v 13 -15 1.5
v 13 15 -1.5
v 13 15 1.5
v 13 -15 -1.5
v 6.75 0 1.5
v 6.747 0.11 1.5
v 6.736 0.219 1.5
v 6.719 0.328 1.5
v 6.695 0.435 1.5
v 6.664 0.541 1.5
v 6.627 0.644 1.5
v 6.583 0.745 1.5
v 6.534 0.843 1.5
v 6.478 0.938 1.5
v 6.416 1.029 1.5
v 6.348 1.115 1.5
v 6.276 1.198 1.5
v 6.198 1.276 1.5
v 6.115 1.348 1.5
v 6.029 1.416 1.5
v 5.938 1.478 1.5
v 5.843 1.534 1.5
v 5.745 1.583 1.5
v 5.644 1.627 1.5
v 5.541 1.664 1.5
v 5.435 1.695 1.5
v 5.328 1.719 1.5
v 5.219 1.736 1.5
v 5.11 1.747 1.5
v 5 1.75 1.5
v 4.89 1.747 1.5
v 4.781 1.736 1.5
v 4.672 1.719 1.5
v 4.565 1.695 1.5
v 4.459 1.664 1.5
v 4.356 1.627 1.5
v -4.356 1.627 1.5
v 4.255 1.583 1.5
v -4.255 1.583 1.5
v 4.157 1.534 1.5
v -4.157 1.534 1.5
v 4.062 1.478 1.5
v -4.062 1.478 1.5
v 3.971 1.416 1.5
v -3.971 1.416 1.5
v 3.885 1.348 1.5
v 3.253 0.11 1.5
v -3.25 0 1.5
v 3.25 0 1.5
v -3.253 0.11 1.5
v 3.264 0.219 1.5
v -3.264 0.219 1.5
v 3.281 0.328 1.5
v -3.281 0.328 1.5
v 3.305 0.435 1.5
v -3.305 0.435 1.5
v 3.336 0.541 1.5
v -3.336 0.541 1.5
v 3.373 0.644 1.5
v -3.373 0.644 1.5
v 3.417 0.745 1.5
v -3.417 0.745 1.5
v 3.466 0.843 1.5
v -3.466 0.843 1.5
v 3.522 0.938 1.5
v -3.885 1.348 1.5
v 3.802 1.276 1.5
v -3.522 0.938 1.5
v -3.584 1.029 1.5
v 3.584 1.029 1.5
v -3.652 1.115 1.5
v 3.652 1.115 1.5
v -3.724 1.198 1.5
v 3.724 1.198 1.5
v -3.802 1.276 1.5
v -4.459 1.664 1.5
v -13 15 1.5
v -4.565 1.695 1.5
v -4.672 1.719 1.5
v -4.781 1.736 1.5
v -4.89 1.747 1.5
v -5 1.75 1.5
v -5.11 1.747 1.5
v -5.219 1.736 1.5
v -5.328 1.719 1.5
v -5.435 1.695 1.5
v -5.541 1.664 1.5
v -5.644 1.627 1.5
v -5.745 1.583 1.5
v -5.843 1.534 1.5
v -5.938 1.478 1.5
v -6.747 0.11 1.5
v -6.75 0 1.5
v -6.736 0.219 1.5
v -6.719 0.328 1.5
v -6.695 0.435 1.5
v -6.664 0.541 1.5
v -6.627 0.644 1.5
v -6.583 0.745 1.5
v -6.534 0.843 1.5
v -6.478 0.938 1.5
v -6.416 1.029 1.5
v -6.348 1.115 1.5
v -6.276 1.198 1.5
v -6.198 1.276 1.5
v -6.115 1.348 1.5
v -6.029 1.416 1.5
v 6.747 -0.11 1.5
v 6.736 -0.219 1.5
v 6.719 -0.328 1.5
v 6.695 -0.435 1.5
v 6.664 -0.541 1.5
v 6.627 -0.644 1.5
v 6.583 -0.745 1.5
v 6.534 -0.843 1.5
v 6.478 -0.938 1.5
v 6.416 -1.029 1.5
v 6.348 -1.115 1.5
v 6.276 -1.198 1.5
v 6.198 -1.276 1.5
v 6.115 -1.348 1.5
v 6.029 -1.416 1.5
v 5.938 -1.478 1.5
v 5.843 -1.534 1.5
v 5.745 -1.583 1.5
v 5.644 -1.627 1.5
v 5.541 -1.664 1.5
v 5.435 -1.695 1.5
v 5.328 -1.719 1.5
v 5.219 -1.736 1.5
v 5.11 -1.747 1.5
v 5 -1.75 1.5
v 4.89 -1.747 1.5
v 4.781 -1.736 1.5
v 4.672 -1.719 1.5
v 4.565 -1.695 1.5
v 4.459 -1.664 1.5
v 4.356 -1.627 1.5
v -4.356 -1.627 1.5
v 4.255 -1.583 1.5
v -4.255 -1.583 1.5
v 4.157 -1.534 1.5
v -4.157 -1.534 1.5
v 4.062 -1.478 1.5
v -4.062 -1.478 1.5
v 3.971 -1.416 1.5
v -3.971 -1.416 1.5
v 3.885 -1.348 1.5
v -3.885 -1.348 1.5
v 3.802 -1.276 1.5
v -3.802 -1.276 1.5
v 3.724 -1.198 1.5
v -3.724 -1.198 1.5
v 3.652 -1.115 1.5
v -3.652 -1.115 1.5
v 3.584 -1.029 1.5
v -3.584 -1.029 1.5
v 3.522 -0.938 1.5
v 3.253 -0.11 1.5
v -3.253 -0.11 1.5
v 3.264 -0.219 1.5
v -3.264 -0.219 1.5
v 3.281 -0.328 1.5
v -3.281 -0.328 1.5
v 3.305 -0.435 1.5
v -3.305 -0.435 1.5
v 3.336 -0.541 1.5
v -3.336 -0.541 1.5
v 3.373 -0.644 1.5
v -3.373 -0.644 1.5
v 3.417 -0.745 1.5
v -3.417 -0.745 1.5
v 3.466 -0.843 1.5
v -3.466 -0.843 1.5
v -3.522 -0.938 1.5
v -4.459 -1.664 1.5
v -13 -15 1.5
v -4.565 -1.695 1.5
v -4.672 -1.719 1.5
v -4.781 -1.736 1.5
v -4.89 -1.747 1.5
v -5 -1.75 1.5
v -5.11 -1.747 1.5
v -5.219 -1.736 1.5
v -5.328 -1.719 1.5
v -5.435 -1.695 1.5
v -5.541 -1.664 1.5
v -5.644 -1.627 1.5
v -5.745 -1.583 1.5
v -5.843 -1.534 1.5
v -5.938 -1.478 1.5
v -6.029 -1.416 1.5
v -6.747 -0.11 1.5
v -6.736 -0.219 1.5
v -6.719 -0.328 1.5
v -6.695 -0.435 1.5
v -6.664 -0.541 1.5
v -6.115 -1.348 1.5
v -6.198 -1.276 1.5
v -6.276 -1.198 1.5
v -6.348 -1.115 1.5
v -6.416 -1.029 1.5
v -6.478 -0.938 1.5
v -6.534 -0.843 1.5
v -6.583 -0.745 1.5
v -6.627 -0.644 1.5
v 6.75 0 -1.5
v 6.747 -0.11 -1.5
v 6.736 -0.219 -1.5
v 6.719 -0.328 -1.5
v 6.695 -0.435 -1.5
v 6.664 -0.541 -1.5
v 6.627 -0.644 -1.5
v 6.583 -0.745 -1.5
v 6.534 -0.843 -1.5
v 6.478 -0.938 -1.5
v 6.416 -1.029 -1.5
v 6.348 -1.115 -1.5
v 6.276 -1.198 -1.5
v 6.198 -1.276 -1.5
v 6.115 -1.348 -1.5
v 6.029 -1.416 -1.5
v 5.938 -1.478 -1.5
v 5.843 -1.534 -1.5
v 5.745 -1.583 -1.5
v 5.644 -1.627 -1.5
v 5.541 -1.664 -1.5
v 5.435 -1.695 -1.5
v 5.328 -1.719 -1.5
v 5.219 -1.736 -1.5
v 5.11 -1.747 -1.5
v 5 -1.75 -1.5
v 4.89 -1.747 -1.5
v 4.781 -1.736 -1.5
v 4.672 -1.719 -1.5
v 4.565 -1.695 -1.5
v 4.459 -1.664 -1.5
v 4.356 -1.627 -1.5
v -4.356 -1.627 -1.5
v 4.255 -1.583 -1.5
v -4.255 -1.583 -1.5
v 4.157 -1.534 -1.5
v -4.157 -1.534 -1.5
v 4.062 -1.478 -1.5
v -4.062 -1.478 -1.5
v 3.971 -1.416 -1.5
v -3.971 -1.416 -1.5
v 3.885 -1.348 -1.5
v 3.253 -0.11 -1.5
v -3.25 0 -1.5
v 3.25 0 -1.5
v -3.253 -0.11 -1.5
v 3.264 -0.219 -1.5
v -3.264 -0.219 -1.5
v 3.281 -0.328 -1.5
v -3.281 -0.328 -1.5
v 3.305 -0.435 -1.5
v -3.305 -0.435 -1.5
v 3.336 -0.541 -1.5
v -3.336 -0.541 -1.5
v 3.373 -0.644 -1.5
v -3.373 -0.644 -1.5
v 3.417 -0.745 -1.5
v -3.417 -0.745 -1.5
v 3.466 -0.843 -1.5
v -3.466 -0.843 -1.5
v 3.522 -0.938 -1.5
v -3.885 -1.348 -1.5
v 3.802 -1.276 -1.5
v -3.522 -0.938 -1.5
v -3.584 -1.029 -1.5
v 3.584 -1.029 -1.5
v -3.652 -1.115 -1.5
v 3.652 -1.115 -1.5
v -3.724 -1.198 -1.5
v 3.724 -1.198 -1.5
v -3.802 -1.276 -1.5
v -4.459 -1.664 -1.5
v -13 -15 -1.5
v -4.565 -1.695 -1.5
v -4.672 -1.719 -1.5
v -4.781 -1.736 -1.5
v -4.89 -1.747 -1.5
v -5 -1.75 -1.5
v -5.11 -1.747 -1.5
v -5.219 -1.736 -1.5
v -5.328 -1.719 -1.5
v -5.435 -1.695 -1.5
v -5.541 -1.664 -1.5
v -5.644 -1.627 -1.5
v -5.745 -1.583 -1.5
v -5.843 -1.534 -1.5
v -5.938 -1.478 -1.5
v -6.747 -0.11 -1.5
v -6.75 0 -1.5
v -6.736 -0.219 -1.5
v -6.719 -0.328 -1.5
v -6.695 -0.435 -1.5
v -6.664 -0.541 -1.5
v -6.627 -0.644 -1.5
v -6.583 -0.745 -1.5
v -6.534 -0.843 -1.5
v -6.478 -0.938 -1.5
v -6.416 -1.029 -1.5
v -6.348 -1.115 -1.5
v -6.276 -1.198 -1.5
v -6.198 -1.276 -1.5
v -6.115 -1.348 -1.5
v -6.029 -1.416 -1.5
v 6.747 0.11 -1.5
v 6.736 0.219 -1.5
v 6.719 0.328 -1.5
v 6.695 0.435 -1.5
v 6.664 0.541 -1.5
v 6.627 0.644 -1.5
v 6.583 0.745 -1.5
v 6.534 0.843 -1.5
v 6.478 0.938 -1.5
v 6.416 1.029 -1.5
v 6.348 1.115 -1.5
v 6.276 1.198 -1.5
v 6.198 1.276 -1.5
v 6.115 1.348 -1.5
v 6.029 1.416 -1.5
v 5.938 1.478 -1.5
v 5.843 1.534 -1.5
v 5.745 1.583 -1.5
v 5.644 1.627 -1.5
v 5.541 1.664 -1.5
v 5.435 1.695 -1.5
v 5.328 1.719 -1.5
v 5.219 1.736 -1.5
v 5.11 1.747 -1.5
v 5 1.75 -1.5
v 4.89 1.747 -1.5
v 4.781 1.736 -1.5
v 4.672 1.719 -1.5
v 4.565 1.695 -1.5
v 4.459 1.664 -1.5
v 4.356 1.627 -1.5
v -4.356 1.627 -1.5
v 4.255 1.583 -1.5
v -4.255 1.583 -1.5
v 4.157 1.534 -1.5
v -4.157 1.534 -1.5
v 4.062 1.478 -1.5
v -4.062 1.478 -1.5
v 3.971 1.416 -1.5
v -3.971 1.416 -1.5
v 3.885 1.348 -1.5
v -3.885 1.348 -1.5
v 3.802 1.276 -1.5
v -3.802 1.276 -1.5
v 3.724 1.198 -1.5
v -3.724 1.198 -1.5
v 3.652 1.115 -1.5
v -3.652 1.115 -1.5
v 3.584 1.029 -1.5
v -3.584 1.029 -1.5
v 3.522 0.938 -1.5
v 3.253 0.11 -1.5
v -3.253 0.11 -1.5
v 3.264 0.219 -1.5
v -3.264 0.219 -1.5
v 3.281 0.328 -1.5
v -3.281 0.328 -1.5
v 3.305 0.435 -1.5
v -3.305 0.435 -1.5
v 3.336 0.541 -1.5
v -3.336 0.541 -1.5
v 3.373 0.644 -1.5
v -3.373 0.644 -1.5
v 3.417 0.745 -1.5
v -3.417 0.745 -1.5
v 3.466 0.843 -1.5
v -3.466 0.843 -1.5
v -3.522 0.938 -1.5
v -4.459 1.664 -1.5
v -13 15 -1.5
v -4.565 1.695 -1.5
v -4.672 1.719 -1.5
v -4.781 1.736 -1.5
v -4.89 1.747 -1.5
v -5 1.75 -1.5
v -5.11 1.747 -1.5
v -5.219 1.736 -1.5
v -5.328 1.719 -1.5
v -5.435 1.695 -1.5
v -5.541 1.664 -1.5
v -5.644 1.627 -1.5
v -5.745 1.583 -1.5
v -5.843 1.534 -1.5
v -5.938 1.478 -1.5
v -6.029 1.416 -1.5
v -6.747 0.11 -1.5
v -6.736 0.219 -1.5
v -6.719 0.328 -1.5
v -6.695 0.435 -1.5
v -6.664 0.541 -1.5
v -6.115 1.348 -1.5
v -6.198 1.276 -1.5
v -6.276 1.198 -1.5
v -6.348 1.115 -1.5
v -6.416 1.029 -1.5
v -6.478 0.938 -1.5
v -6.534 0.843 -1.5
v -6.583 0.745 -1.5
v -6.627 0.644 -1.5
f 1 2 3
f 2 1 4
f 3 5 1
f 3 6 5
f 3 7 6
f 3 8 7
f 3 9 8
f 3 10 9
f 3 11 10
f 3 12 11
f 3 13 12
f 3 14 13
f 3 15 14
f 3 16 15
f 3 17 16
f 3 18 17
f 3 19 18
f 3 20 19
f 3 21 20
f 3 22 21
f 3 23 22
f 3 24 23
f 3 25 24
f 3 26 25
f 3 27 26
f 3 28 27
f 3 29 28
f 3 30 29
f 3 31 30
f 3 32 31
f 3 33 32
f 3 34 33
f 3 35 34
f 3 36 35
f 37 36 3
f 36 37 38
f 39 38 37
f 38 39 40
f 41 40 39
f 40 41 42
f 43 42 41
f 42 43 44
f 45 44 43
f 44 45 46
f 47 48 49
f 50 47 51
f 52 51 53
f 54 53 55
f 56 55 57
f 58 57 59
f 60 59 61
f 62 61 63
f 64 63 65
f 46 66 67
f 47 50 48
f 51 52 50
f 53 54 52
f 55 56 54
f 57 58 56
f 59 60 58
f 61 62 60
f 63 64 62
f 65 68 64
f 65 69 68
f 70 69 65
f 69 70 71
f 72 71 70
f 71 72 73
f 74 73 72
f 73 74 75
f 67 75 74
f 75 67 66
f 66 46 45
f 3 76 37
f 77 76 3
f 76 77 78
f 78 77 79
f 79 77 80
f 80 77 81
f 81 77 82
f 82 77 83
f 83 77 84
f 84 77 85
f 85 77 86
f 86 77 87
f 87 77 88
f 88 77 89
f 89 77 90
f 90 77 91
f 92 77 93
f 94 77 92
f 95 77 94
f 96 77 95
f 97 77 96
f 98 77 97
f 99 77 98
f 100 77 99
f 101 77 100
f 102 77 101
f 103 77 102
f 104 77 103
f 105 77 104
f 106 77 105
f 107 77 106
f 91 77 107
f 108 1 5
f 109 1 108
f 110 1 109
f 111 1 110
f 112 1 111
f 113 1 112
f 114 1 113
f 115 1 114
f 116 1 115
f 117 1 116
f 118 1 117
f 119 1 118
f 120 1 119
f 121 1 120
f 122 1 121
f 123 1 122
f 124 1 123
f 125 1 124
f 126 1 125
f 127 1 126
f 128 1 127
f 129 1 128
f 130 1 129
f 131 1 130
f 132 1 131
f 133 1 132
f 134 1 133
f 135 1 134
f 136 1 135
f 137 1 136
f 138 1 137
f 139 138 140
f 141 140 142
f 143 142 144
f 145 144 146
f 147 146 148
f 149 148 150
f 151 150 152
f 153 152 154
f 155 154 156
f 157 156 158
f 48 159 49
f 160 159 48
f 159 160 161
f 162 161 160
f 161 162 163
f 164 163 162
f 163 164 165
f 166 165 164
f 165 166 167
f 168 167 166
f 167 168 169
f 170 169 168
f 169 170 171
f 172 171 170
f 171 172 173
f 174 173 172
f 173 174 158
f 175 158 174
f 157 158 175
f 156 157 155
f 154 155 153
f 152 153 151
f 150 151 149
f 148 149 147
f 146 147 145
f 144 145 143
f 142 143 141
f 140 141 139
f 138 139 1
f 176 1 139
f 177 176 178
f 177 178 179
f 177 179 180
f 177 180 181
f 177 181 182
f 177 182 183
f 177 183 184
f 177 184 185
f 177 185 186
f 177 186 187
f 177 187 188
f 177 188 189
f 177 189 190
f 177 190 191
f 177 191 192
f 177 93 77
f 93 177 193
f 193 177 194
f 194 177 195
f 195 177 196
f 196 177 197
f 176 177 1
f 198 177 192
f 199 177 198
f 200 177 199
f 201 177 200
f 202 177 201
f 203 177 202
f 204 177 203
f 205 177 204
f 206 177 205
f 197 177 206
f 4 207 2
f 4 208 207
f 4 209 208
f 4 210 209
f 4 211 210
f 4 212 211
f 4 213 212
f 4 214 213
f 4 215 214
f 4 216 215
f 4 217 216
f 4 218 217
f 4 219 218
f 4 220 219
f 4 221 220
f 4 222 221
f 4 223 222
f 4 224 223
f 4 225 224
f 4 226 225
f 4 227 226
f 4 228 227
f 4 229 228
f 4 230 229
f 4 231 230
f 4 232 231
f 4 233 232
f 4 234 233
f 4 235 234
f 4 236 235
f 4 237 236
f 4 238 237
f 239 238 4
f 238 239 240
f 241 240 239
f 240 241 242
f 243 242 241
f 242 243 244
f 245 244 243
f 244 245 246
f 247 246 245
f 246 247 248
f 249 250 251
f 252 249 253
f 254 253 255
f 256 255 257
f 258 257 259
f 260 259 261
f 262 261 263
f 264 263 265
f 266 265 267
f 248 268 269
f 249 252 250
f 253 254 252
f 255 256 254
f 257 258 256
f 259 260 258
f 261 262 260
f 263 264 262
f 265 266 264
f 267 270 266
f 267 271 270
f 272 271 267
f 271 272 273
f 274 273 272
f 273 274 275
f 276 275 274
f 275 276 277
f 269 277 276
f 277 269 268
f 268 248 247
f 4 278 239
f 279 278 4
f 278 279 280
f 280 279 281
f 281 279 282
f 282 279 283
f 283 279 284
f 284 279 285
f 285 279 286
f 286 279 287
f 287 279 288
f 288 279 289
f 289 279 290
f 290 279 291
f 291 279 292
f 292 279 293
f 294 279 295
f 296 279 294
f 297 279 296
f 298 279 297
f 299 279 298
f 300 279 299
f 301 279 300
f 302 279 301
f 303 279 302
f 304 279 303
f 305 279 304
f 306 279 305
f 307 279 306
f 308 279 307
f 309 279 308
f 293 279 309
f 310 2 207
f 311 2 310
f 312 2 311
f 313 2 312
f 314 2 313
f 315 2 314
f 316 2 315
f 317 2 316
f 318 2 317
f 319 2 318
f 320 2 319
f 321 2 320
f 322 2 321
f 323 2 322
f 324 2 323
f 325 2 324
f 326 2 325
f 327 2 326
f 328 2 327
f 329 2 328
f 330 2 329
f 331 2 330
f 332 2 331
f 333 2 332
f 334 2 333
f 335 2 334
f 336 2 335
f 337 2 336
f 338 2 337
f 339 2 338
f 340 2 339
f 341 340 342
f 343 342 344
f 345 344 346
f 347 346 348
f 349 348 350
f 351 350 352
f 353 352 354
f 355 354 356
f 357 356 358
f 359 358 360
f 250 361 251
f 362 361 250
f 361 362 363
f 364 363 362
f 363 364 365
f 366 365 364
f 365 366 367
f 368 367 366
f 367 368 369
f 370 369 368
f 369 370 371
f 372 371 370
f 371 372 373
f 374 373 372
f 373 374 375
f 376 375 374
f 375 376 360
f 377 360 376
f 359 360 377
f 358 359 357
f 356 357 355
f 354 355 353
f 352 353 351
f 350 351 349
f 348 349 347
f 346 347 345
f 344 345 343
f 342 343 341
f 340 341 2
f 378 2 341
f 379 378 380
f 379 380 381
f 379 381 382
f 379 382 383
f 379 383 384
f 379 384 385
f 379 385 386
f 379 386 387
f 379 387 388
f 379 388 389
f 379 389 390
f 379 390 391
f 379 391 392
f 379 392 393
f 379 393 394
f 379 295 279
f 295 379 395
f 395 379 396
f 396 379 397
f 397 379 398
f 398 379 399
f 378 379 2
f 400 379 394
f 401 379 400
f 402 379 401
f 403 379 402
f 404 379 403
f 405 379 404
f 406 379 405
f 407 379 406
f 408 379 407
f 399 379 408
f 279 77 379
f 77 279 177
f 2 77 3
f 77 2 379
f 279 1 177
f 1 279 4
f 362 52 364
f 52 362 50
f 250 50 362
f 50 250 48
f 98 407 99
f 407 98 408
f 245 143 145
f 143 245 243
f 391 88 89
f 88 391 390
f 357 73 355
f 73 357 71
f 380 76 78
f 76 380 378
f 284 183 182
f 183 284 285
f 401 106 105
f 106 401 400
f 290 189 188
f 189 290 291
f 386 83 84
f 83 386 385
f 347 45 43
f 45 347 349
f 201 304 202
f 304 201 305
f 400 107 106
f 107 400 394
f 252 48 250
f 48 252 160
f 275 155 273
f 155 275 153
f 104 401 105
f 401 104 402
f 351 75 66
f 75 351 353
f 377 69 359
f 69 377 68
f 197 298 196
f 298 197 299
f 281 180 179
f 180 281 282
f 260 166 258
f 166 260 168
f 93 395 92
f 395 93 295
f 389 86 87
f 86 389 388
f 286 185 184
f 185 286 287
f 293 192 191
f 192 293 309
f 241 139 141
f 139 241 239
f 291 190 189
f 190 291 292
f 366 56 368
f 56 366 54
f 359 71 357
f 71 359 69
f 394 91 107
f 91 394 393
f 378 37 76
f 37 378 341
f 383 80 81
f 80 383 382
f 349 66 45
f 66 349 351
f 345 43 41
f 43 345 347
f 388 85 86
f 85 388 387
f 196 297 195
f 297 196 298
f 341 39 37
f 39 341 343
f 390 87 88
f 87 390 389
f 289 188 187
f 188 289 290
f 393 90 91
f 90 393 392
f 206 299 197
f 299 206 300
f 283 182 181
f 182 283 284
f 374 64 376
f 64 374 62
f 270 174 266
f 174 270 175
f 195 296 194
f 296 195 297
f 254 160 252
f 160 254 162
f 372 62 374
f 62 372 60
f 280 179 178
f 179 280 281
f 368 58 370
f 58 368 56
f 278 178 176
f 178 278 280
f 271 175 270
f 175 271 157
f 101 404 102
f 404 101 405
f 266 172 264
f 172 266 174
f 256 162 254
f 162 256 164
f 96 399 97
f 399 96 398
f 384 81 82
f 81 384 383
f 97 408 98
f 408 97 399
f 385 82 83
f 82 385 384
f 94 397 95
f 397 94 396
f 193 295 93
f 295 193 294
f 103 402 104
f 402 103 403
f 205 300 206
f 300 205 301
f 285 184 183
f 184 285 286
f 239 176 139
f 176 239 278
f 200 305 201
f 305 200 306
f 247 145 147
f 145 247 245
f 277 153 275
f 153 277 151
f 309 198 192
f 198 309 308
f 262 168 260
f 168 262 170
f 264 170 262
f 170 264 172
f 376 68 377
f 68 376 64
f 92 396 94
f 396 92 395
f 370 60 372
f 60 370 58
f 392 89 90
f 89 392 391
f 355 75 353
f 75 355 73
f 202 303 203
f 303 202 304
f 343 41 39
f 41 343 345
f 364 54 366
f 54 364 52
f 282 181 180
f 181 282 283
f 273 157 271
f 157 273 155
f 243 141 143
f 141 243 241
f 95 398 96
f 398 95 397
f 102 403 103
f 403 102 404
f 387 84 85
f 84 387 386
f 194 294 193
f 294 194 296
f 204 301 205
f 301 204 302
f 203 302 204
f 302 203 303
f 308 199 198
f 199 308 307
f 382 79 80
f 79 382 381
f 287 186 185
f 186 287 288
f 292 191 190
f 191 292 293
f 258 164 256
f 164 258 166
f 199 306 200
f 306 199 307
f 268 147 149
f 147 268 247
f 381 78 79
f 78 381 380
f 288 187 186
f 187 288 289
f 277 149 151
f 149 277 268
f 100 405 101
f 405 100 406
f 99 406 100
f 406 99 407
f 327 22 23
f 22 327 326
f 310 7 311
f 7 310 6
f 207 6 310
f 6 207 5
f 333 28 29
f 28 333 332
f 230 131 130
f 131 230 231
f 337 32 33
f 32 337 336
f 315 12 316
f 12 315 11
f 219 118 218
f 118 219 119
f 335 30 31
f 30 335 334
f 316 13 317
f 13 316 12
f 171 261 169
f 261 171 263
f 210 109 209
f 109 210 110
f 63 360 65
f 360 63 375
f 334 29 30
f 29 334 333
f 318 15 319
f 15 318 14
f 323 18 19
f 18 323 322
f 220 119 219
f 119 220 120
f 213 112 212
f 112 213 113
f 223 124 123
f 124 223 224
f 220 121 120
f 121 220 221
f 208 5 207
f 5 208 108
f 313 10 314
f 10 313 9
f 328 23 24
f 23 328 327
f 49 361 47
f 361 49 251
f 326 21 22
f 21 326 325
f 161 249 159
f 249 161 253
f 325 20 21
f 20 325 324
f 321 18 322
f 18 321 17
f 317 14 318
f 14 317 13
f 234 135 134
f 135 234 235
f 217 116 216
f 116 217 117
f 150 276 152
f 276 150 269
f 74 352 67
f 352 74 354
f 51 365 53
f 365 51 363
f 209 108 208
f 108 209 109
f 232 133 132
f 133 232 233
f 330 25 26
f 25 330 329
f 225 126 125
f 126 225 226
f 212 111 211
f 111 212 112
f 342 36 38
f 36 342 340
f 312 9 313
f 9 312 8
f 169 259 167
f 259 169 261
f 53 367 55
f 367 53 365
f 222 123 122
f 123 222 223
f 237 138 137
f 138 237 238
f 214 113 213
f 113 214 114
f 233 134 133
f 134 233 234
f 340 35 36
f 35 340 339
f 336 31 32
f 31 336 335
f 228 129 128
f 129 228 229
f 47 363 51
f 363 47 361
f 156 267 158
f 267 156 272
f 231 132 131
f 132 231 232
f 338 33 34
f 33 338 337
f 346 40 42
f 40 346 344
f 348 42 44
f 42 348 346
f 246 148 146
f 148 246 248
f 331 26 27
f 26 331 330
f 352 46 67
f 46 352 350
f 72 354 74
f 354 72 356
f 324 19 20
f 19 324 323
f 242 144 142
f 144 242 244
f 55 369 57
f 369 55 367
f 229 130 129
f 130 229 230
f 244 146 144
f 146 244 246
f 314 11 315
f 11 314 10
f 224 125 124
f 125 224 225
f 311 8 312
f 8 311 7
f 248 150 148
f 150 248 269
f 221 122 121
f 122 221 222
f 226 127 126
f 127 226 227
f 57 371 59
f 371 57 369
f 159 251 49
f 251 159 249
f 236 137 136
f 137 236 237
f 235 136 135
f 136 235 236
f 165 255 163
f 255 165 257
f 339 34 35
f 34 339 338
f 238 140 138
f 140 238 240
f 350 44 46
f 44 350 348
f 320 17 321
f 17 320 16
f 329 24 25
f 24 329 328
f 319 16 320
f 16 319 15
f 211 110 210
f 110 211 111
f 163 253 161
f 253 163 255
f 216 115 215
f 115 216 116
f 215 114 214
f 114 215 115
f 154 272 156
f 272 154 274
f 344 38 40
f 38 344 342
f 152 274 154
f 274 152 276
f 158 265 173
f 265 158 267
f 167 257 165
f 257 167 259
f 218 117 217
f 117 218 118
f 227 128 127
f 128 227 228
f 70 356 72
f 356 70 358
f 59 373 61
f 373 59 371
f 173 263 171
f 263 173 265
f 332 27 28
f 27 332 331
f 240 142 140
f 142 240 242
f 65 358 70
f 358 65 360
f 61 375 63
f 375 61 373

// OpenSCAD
holes_pitch = 30;
walls = 3;
chain_height = 10;
chain_pitch = 10;
hole_size = 3.5;
h_base = 100;

w = holes_pitch + 4*walls;


module hb_chain_holder() {
	difference() {
		translate([w/-2, h_base/-2, 0]) union() {
			cube(size=[w, h_base, walls]);
			cube(size=[w, walls, chain_height]);
		}
		cube(size=[hole_size, h_base-3*walls, walls*5], center=true);
		translate([holes_pitch/-2, 0, 0]) cube(size=[hole_size, h_base-3*walls, walls*5], center=true);
		translate([holes_pitch/2, 0, 0]) cube(size=[hole_size, h_base-3*walls, walls*5], center=true);

		translate([chain_pitch/-2, h_base/-2+walls+1, chain_height/2]) rotate(a=[90, 0, 0]) cylinder(d=hole_size, h=walls*3, $fn=100);
		translate([chain_pitch/2, h_base/-2+walls+1, chain_height/2]) rotate(a=[90, 0, 0]) cylinder(d=hole_size, h=walls*3, $fn=100);
	}
}

module chain_profile_pad() {
	difference() {
		cube(size=[26, 30, walls], center=true);
		translate([chain_pitch/-2, 0, walls*-1]) cylinder(d=hole_size, h=walls*2, $fn=100);
		translate([chain_pitch/2, 0, walls*-1]) cylinder(d=hole_size, h=walls*2, $fn=100);
	}
}

//hb_chain_holder();
chain_profile_pad();
